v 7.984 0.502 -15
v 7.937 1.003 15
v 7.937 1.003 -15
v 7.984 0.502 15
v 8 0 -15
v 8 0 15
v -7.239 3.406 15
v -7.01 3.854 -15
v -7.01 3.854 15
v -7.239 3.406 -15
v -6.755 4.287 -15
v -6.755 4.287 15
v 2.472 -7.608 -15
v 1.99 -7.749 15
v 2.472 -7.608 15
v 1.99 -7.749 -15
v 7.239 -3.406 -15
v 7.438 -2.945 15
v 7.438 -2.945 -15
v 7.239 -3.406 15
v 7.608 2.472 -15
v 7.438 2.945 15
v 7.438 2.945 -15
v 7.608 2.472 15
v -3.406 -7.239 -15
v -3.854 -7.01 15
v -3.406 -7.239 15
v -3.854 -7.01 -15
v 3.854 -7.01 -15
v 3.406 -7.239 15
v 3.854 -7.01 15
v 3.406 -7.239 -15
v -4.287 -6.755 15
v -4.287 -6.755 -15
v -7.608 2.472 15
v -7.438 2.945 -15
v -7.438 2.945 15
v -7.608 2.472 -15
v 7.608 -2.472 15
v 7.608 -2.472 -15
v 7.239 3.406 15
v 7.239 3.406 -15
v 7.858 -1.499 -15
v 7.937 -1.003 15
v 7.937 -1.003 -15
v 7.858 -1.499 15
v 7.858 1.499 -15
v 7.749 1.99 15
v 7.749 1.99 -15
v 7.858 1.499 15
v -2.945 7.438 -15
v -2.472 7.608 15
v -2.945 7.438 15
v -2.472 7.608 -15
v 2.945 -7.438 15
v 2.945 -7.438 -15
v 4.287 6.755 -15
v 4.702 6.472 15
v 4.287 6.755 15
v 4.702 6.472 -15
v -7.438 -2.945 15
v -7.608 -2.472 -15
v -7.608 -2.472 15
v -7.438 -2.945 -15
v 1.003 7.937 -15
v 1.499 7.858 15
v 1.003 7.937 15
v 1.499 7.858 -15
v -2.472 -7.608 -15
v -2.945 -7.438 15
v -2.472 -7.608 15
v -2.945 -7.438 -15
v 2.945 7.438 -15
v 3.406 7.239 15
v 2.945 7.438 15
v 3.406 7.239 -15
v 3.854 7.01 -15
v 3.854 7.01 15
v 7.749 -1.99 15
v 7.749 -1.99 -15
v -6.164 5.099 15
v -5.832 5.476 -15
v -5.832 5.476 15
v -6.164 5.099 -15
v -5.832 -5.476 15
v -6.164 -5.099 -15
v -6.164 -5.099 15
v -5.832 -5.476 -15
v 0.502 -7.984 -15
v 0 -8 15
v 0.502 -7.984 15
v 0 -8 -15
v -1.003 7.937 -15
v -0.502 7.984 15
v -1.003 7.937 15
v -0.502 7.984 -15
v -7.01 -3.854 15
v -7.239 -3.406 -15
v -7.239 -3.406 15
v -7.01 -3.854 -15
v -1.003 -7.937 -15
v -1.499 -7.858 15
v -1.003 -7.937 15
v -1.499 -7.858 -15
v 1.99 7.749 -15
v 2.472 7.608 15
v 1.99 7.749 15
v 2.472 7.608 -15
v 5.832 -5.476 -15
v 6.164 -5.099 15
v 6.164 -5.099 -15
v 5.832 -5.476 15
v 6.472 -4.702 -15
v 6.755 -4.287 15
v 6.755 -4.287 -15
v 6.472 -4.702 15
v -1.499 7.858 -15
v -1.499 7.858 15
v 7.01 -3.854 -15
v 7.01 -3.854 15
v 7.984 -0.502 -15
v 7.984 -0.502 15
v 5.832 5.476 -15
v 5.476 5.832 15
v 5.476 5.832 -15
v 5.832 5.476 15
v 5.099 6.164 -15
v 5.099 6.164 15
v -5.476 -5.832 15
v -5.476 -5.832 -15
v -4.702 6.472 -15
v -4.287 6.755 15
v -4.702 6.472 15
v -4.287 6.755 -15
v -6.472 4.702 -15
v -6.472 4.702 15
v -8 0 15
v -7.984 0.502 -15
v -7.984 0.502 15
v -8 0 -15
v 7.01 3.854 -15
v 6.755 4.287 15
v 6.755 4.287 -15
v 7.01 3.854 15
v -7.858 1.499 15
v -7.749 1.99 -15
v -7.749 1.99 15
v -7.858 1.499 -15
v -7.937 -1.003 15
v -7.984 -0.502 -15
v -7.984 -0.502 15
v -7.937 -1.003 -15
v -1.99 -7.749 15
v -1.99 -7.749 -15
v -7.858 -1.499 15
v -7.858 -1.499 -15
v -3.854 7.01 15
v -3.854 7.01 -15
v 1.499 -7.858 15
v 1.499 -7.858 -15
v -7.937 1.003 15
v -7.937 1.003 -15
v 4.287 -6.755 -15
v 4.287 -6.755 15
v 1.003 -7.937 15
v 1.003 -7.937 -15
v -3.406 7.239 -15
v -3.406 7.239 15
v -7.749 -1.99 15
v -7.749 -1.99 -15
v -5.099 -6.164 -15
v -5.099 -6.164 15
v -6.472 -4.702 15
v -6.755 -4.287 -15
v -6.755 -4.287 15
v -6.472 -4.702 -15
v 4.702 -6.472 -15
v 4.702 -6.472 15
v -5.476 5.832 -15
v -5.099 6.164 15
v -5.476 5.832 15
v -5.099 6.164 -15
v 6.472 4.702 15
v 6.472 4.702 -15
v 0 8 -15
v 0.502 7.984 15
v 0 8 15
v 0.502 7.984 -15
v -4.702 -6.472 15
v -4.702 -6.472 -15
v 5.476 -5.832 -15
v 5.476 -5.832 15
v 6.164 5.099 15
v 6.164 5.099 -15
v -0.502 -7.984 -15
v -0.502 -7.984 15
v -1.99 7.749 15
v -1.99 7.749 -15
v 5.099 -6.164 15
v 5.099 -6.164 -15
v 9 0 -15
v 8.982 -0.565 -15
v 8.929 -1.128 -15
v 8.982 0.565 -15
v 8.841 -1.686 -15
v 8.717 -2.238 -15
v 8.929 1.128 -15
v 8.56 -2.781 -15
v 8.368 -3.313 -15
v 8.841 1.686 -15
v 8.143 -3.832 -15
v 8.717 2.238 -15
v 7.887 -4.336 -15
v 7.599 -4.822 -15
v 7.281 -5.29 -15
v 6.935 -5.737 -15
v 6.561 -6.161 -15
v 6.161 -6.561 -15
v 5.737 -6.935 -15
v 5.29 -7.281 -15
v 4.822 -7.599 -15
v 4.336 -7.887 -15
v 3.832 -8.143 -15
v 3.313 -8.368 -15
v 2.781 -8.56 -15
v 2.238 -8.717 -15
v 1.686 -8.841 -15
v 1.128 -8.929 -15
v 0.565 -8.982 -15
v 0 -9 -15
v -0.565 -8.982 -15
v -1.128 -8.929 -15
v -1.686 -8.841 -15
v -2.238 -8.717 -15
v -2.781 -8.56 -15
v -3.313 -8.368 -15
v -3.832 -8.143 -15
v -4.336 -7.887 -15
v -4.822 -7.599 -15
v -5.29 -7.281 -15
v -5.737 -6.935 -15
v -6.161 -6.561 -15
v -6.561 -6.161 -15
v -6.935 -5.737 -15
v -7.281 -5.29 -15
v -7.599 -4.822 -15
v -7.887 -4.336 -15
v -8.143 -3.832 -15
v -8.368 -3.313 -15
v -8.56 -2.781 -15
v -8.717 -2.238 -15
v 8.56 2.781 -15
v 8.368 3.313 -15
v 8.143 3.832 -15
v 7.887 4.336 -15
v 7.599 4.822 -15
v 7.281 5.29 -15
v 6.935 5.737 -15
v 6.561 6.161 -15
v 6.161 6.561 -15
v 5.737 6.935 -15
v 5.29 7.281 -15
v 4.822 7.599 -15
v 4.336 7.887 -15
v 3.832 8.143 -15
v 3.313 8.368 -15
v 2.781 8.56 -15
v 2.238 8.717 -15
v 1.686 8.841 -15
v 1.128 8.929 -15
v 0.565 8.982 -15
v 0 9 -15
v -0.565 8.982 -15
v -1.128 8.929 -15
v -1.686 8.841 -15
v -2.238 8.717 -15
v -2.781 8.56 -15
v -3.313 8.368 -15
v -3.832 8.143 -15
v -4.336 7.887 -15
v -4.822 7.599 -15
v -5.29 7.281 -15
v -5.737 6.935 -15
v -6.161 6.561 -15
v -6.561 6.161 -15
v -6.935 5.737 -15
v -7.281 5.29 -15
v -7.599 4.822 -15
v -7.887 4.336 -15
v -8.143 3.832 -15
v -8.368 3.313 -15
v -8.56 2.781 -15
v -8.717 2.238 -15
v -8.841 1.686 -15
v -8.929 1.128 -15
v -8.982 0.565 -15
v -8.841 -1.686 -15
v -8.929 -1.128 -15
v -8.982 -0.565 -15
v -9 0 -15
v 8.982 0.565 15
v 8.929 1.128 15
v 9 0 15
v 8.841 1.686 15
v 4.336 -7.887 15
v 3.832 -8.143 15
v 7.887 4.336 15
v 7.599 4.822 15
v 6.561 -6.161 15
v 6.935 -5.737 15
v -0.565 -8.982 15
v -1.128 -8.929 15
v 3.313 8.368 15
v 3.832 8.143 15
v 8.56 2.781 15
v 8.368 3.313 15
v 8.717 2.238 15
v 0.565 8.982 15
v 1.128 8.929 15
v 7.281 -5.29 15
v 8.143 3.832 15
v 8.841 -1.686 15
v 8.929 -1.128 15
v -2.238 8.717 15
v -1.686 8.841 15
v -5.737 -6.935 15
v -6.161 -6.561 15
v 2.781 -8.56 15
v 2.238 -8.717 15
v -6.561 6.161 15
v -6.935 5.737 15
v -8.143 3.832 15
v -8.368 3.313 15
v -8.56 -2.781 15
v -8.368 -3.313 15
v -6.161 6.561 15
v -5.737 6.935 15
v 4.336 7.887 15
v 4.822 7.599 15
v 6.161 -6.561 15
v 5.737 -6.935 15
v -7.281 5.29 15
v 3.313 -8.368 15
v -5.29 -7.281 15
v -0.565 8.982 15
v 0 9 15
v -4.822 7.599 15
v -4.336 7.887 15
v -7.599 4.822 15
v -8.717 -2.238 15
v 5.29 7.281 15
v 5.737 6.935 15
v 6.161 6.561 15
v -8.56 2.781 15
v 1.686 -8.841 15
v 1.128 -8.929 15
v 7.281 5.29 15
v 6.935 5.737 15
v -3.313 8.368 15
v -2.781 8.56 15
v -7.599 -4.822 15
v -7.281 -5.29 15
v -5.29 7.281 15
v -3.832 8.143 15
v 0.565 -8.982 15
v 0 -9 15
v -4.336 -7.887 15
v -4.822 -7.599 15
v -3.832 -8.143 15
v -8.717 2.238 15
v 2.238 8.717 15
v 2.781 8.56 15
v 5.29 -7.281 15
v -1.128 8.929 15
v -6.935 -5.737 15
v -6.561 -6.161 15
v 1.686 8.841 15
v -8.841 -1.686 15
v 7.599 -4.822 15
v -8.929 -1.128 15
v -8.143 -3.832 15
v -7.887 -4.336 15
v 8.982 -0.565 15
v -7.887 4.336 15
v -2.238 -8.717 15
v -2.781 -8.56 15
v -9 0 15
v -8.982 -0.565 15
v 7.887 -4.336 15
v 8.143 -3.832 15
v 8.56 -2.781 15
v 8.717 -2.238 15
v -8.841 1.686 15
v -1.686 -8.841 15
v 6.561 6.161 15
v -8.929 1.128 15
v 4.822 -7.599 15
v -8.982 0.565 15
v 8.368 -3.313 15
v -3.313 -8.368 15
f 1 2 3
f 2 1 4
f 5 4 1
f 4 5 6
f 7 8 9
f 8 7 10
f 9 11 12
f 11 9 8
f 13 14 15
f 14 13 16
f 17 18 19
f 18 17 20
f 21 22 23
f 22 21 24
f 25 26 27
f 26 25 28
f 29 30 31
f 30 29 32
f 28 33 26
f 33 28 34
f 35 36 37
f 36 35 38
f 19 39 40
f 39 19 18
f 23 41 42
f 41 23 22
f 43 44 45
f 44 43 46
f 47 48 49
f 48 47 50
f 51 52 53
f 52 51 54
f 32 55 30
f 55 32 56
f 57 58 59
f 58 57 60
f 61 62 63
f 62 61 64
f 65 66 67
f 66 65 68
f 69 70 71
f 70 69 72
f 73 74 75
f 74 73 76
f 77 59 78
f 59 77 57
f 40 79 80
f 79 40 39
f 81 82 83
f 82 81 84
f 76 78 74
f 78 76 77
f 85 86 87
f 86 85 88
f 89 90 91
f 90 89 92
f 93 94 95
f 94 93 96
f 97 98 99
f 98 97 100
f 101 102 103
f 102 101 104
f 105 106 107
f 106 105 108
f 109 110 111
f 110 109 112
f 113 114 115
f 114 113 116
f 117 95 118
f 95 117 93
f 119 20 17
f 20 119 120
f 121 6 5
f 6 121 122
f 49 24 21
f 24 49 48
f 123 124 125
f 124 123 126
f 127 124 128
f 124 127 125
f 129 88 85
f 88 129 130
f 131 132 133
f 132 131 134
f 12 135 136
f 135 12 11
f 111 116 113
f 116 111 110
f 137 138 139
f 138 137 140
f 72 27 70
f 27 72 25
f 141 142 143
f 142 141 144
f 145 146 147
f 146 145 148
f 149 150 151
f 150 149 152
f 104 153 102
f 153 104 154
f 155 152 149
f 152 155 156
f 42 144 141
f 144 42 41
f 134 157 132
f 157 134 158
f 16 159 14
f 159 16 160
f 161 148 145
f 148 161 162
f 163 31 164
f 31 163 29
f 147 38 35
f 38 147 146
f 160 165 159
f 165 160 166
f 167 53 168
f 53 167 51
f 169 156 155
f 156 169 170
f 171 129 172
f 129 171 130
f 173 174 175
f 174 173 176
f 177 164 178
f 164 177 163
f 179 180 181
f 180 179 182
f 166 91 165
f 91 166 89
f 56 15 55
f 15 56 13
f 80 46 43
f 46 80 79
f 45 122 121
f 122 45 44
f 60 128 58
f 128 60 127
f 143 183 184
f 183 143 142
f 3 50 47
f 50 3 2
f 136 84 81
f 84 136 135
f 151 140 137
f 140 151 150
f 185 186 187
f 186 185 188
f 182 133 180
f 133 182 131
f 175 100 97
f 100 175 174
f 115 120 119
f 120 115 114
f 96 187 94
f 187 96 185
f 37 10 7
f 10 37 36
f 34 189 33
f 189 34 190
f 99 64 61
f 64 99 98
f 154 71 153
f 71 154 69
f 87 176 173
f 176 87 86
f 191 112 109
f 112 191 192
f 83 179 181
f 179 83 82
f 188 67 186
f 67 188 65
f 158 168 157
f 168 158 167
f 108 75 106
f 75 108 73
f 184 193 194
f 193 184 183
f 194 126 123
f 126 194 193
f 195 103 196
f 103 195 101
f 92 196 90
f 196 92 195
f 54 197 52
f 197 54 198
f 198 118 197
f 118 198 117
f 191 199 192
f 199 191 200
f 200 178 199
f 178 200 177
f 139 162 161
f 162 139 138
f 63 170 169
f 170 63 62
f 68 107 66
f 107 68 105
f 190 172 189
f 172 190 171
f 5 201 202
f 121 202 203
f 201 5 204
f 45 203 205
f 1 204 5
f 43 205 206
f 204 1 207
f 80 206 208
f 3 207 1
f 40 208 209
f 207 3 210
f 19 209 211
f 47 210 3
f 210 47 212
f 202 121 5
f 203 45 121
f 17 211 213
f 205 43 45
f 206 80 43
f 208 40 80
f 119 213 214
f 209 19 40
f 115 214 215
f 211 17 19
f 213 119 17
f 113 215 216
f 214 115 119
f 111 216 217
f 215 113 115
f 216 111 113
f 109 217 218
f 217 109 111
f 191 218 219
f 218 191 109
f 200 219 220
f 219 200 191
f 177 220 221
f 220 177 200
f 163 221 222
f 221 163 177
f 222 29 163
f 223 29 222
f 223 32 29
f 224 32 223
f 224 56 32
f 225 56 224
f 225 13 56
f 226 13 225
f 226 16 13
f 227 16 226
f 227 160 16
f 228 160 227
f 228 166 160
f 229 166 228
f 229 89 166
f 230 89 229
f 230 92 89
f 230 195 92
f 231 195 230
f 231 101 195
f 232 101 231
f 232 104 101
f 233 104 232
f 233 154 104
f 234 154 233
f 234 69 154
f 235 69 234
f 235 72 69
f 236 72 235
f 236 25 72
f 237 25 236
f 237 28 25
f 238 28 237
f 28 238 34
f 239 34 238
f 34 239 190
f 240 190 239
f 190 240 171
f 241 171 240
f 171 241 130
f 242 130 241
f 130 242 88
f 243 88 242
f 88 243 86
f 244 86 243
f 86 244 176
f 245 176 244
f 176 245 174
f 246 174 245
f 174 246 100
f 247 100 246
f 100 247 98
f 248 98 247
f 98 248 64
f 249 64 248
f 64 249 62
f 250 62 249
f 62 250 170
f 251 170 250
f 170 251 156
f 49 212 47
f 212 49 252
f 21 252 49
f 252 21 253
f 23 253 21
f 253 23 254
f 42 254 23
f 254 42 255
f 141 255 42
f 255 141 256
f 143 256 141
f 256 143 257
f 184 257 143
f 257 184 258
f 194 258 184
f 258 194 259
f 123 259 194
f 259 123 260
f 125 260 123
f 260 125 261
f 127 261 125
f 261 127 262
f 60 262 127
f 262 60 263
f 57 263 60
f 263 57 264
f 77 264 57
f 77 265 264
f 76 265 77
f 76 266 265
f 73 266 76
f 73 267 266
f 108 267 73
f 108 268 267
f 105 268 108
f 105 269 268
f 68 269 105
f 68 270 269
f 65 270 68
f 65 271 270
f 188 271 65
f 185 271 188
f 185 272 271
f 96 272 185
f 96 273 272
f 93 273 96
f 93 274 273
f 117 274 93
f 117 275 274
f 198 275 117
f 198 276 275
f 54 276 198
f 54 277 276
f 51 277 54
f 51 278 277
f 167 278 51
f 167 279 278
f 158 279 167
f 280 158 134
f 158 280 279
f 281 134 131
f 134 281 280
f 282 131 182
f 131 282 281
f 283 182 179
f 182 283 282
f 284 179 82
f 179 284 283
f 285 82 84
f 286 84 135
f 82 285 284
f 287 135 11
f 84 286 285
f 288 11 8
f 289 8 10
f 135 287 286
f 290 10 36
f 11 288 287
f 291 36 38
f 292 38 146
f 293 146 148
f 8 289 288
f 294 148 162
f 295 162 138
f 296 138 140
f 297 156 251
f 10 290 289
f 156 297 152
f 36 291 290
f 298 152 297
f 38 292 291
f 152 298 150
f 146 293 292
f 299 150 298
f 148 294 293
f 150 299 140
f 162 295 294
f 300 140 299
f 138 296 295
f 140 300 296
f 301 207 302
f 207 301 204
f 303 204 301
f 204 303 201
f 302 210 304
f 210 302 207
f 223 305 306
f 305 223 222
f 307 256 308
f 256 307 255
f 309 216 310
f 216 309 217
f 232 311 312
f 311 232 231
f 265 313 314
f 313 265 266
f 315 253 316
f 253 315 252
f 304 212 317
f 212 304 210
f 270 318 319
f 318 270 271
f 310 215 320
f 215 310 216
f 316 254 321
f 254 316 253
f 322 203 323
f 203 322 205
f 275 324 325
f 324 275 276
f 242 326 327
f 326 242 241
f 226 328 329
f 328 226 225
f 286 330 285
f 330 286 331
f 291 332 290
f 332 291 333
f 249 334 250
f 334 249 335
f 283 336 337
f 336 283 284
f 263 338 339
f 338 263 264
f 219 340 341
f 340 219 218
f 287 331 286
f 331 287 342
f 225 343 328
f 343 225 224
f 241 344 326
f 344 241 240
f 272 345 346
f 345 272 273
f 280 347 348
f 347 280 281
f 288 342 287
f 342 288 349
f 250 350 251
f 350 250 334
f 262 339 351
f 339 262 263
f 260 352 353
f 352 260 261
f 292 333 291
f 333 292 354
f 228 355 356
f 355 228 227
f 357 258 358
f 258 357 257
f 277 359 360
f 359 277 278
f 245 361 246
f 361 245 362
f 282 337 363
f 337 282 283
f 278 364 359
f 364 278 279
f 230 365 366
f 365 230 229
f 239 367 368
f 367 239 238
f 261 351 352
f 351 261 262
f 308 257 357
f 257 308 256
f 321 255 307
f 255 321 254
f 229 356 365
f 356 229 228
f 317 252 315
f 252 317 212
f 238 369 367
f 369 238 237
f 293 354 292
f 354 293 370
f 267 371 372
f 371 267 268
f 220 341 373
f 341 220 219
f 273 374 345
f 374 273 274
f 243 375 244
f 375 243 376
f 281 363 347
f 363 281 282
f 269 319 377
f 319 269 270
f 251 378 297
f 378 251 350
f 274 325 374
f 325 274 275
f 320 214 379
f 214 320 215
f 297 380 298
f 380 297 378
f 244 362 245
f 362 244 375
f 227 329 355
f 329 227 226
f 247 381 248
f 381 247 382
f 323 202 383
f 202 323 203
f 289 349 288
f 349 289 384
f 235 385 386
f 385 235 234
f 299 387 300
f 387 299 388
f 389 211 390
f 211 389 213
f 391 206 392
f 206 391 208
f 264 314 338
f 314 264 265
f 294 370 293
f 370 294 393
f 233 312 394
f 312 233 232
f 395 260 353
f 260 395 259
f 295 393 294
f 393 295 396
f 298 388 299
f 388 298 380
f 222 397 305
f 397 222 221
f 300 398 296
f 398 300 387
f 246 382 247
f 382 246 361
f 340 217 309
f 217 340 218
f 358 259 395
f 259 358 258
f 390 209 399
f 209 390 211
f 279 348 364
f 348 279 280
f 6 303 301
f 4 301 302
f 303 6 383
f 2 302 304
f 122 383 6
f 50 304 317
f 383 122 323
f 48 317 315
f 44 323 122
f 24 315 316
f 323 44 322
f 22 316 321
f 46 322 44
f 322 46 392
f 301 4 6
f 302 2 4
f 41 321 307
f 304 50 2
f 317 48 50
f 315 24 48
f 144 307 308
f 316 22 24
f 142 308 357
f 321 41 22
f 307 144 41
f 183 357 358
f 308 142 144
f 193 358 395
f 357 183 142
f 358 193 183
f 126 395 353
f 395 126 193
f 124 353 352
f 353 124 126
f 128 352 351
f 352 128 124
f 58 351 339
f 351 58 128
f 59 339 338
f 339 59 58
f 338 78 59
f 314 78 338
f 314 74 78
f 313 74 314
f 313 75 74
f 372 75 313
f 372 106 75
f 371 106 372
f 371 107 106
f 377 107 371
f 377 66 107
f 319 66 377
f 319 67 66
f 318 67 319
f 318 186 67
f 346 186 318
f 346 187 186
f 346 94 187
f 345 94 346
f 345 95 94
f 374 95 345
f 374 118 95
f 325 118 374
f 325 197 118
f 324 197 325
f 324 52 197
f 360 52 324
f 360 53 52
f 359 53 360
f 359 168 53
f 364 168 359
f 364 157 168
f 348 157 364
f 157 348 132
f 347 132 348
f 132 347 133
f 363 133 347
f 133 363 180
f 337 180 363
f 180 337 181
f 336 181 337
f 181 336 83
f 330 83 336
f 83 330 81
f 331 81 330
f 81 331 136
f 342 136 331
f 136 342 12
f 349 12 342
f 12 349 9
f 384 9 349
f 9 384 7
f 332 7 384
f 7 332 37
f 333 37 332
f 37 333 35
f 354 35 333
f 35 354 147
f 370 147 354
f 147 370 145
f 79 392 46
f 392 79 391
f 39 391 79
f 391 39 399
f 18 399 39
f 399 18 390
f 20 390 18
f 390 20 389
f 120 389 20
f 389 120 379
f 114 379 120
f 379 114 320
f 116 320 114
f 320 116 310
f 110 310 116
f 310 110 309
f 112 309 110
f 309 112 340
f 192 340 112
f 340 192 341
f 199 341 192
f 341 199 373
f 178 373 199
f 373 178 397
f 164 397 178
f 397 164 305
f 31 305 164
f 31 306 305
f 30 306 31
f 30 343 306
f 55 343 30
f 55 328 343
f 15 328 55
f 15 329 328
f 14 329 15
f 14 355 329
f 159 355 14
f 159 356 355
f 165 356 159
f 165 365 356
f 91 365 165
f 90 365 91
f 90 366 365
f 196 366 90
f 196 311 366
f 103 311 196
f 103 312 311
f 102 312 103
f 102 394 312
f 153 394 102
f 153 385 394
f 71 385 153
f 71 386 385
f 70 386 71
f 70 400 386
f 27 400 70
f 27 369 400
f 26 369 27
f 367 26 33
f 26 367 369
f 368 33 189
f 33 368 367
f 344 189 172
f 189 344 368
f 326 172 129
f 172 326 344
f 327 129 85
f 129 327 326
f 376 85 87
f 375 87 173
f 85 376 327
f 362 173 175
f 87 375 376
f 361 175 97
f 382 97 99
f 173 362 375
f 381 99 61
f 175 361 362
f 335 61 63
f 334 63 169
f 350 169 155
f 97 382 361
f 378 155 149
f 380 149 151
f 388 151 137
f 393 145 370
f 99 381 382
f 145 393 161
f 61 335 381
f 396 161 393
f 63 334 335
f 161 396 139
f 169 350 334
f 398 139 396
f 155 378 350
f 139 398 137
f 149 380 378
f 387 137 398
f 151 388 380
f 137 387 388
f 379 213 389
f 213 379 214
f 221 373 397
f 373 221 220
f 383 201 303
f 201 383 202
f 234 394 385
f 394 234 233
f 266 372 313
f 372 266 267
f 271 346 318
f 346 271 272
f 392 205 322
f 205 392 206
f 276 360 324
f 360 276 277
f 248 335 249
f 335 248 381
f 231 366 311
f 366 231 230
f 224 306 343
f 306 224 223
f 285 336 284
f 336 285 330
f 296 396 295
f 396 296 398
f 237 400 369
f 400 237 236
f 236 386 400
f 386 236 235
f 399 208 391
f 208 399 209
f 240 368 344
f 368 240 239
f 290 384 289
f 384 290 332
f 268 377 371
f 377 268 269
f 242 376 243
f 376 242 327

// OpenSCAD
//Author: Lucia Prieto Godino
//mail: lucia.prieto@cantab.net
//February 2016
//Cover tubes behaviour

// Customazible variables

// height
height = 30; 
// diameter
diameter = 9; 

////////////////////////////////////////////////////////
module customizer_off(){};
////////////////////////////////////////////////////////

h1= height;
r1= diameter;
r2 = r1-1;


module Base() {
cylinder($fn=100,h= h1, r = r1, center = true);
}

//Base();

module inside() {
cylinder ( $fn=100,h = h1, r = r2, centre = true);
 translate ([0,0,-h1/2]){cylinder ($fn=100, h = h1, r = r2, centre = true);}
}

//inside();

module final() {
difference () {Base() ; inside();}
}

final();
